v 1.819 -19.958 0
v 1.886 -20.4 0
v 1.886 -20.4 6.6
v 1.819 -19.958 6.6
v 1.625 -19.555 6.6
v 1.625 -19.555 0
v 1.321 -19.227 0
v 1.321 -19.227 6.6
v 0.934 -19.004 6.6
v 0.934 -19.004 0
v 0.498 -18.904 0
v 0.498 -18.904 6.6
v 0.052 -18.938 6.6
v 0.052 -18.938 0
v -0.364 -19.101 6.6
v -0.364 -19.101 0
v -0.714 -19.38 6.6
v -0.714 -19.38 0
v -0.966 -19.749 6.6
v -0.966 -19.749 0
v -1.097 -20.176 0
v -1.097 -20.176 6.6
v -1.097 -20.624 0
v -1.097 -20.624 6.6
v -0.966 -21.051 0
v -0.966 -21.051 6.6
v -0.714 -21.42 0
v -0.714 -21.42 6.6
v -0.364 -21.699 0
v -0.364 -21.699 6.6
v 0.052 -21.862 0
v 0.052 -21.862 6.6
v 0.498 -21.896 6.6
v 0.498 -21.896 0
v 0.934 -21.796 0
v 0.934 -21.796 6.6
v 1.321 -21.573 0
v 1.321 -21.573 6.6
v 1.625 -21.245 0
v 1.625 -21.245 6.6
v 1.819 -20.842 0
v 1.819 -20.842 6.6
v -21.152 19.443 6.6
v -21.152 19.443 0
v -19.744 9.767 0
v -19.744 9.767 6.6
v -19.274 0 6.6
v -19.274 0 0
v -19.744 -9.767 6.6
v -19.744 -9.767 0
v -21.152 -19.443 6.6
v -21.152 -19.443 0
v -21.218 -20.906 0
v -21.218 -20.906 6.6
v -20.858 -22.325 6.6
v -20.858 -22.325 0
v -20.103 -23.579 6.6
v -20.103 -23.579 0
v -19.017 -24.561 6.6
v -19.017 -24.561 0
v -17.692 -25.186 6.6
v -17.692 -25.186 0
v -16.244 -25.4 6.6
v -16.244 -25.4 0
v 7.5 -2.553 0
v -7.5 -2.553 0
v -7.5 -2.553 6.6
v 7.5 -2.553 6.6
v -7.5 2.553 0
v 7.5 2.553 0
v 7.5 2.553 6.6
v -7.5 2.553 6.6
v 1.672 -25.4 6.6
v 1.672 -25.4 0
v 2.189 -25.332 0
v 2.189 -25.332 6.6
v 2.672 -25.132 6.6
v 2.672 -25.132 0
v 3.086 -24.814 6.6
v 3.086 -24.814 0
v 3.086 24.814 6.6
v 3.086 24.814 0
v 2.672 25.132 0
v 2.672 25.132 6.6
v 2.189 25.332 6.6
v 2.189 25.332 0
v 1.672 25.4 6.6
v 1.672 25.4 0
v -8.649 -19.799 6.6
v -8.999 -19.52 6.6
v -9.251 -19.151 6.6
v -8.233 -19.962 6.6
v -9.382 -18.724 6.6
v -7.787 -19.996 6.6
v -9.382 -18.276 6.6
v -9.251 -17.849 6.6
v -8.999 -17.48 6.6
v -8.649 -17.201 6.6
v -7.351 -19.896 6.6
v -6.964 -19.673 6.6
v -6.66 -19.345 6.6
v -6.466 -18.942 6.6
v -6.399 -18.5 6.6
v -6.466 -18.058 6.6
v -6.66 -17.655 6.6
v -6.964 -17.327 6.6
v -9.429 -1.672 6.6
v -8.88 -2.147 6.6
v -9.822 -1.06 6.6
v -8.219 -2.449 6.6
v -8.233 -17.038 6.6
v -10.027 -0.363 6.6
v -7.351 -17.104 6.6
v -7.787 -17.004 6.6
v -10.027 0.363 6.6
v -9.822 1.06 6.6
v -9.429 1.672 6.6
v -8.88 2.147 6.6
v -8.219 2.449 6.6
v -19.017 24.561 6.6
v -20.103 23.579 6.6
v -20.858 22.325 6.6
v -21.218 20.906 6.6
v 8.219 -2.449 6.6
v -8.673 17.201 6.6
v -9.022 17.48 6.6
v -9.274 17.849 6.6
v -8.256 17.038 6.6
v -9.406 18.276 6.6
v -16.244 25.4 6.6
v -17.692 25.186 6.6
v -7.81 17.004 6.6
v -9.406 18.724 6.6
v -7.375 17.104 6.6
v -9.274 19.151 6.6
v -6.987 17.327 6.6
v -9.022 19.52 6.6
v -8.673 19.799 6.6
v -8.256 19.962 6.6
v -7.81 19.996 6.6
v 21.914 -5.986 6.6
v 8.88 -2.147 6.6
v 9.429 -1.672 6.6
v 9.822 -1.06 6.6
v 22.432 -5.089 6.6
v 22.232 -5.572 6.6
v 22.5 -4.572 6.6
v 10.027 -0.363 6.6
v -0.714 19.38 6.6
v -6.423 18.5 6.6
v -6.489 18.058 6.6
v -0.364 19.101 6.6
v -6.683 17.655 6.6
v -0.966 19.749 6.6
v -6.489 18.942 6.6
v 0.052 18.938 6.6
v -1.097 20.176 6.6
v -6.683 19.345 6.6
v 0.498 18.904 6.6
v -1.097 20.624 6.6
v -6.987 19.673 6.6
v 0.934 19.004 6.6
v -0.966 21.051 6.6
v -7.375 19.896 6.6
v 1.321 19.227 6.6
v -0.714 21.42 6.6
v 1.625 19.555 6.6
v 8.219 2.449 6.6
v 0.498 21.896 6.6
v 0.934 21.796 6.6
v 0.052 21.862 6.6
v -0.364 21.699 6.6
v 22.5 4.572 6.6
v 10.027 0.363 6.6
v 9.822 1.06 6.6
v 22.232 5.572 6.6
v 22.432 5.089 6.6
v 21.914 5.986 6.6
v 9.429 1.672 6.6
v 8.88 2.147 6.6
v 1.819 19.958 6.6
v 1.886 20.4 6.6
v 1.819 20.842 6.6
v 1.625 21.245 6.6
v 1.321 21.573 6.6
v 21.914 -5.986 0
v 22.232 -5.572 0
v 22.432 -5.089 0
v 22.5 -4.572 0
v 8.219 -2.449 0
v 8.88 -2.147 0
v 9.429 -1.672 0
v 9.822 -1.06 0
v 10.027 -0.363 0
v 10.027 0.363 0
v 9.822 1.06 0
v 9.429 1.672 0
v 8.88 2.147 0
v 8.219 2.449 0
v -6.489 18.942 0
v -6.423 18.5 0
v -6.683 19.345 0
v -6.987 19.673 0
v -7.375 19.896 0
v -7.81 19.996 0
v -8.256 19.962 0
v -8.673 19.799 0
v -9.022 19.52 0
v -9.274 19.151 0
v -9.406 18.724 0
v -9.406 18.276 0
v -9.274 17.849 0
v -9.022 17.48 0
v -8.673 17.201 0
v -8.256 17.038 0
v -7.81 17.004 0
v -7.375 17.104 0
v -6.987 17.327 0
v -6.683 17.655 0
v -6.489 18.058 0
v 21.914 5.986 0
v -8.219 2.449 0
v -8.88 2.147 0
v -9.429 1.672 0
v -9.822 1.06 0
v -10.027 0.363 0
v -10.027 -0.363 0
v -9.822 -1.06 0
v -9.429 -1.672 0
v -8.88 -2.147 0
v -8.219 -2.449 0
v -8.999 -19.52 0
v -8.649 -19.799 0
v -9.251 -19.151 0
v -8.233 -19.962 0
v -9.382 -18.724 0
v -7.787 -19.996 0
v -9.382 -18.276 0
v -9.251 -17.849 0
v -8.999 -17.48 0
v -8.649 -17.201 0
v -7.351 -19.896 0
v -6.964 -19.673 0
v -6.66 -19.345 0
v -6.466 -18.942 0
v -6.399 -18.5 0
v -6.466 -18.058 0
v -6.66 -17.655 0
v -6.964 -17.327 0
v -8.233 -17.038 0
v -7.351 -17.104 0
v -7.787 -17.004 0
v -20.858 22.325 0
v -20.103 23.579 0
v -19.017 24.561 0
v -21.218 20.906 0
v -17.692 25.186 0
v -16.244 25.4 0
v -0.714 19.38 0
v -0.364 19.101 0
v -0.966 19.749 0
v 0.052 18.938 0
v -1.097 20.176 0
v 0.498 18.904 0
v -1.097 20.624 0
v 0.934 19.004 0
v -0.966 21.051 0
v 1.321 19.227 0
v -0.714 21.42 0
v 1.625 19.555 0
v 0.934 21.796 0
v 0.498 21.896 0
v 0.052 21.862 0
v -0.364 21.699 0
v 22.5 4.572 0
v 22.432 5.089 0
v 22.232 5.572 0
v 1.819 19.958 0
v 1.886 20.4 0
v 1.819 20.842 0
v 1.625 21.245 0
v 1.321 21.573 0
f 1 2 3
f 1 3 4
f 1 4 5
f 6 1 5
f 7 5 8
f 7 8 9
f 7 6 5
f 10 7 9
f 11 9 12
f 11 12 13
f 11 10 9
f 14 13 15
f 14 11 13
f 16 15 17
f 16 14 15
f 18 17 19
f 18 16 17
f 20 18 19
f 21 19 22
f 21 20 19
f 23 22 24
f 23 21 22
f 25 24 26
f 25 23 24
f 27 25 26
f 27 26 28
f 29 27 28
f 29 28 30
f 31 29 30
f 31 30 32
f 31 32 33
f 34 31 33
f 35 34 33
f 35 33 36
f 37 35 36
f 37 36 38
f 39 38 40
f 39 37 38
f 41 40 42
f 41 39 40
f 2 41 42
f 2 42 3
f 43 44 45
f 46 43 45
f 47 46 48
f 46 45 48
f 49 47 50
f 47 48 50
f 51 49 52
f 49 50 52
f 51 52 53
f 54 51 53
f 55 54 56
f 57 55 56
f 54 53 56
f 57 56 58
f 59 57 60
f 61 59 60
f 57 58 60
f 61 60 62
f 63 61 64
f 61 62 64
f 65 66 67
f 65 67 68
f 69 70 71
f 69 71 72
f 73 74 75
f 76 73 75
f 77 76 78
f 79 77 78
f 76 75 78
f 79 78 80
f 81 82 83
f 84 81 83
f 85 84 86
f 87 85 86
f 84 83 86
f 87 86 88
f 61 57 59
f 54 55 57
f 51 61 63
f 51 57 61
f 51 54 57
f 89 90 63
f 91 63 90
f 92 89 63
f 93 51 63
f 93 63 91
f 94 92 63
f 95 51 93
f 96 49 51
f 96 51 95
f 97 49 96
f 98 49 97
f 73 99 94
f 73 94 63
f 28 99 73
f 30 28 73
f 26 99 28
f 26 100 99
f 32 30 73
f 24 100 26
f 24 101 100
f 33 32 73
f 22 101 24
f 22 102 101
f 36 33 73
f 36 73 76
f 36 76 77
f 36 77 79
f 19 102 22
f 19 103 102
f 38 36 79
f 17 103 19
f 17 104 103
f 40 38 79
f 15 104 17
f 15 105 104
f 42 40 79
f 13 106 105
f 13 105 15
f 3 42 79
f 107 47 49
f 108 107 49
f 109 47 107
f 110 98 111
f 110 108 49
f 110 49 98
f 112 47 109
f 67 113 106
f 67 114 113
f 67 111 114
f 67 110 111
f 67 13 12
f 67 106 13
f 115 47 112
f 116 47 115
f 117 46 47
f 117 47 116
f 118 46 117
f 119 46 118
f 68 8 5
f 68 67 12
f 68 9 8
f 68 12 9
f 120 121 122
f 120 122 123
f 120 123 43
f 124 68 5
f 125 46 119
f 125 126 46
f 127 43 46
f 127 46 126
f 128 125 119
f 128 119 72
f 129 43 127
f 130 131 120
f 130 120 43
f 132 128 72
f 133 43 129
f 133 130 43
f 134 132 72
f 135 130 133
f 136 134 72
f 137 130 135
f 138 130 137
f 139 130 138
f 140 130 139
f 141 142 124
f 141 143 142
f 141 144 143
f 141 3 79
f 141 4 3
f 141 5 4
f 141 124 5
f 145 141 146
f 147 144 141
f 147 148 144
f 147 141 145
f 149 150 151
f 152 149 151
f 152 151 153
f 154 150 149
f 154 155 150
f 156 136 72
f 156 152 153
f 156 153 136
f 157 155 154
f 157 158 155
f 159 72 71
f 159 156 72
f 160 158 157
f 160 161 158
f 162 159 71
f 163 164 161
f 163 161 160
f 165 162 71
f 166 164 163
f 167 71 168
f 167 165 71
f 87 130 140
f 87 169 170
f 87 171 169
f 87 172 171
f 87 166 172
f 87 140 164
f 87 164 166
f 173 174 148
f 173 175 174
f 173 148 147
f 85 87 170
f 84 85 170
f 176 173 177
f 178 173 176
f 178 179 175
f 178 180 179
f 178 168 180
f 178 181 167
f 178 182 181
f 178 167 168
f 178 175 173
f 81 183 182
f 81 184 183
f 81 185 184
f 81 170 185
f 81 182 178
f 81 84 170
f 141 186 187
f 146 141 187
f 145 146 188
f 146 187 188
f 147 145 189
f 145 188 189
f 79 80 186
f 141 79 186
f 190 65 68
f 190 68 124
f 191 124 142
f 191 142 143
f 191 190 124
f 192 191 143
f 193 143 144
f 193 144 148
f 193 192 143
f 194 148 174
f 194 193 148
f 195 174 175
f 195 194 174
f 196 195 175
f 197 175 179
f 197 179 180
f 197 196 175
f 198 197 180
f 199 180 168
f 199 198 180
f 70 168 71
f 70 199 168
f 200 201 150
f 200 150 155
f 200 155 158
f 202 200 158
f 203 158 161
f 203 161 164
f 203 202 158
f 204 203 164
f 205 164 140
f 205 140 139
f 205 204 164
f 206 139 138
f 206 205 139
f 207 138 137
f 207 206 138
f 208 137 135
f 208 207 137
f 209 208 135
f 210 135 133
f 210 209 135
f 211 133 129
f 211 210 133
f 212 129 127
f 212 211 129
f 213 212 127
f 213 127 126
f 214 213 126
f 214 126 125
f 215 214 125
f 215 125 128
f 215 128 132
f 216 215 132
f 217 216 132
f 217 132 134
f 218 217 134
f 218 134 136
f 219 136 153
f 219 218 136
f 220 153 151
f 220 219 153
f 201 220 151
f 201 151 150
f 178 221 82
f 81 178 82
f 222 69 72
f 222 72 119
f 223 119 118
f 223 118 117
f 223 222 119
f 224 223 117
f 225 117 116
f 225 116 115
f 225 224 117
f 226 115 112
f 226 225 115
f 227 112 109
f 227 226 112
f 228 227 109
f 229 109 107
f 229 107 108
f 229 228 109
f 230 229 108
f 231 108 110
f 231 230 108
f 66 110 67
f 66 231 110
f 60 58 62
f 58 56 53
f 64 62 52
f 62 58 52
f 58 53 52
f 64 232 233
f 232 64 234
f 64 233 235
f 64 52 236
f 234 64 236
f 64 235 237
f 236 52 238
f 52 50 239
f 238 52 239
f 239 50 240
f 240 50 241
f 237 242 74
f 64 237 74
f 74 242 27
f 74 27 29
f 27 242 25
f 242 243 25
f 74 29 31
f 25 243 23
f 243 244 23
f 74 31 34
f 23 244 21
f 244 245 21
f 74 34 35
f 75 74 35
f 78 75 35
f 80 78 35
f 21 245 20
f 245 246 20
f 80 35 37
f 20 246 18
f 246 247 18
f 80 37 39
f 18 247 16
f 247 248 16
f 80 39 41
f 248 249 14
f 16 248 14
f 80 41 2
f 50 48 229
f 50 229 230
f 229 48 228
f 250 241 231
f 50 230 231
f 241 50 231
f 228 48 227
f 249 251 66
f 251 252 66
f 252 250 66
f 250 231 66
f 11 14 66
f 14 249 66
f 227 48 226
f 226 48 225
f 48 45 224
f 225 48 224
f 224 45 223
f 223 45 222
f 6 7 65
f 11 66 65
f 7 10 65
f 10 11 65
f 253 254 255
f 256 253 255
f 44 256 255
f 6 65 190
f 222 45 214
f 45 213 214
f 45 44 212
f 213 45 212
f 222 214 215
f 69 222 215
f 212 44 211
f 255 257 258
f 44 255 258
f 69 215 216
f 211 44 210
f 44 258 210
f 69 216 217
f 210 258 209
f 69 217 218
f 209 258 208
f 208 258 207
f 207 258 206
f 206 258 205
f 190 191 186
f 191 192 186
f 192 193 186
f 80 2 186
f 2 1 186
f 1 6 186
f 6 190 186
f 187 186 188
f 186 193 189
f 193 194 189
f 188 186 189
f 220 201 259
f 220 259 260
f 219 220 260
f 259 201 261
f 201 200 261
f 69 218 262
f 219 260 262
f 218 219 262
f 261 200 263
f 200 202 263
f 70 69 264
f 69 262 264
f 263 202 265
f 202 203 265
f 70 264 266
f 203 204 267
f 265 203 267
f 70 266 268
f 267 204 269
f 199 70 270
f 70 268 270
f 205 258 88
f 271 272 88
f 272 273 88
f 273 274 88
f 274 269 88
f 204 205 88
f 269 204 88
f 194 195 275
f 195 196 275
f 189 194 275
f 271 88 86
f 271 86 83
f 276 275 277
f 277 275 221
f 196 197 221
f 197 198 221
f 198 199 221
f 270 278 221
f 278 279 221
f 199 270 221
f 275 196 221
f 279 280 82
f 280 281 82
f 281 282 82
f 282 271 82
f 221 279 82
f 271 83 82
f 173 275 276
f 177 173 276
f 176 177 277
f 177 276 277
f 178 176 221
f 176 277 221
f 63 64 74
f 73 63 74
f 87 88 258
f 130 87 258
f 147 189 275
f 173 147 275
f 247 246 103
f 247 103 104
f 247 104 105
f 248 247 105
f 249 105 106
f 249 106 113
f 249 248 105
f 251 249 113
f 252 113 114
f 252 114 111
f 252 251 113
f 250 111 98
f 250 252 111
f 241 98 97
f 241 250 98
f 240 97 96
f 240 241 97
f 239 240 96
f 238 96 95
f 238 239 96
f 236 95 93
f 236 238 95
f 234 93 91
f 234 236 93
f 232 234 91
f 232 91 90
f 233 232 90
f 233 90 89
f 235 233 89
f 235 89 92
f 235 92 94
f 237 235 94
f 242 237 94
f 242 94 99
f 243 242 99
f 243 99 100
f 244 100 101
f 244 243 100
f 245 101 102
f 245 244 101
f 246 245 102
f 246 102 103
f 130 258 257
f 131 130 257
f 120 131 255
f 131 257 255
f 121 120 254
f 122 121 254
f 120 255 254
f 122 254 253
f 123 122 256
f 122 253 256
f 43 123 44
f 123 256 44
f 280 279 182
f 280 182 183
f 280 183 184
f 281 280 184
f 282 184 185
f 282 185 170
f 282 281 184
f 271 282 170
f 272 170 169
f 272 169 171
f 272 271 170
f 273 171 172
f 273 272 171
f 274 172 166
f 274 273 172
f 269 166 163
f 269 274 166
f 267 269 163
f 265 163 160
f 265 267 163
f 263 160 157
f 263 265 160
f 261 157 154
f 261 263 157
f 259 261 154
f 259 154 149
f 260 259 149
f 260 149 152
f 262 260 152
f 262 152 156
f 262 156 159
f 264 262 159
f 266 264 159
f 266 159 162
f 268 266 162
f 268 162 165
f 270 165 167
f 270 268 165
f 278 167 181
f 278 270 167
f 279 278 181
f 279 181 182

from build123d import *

# Parameters (mm, degrees)
MODEL_R             = 1.5
BOSS_EXTRUDE1_DEPTH = 6.6


with BuildPart() as part:
    # Model → Boss-Extrude1 (new body)
    with BuildSketch(Plane.XY):
        with BuildLine():
            Line((3.085786438, -24.814213562), (21.914213562, -5.985786438))
            ThreePointArc((21.914213562, -5.985786438), (22.347759065, -5.33693974), (22.5, -4.571572875))
            Line((22.5, -4.571572875), (22.5, 4.571572875))
            ThreePointArc((22.5, 4.571572875), (22.347759065, 5.33693974), (21.914213562, 5.985786438))
            Line((21.914213562, 5.985786438), (3.085786438, 24.814213562))
            ThreePointArc((3.085786438, 24.814213562), (2.43693974, 25.247759065), (1.671572875, 25.4))
            Line((1.671572875, 25.4), (-16.243953329, 25.4))
            ThreePointArc((-16.243953329, 25.4), (-20.102984306, 23.579289217), (-21.151543558, 19.44315197))
            ThreePointArc((-21.151543558, 19.44315197), (-19.273776994, 0), (-21.151543558, -19.44315197))
            ThreePointArc((-21.151543558, -19.44315197), (-20.102984306, -23.579289217), (-16.243953329, -25.4))
            Line((-16.243953329, -25.4), (1.671572875, -25.4))
            ThreePointArc((1.671572875, -25.4), (2.43693974, -25.247759065), (3.085786438, -24.814213562))
        make_face()
        with Locations((0.385786438, 20.4)):
            Circle(MODEL_R, mode=Mode.SUBTRACT)
        with Locations((0.385786438, -20.4)):
            Circle(MODEL_R, mode=Mode.SUBTRACT)
        with Locations((-7.922562904, 18.5)):
            Circle(MODEL_R, mode=Mode.SUBTRACT)
        with Locations((-7.899139633, -18.5)):
            Circle(MODEL_R, mode=Mode.SUBTRACT)
        with BuildLine():
            Line((-7.5, -2.5527), (7.5, -2.5527))
            ThreePointArc((7.5, -2.5527), (10.0527, 0), (7.5, 2.5527))
            Line((7.5, 2.5527), (-7.5, 2.5527))
            ThreePointArc((-7.5, 2.5527), (-10.0527, 0), (-7.5, -2.5527))
        make_face(mode=Mode.SUBTRACT)
    extrude(amount=BOSS_EXTRUDE1_DEPTH)


solid = part.part
